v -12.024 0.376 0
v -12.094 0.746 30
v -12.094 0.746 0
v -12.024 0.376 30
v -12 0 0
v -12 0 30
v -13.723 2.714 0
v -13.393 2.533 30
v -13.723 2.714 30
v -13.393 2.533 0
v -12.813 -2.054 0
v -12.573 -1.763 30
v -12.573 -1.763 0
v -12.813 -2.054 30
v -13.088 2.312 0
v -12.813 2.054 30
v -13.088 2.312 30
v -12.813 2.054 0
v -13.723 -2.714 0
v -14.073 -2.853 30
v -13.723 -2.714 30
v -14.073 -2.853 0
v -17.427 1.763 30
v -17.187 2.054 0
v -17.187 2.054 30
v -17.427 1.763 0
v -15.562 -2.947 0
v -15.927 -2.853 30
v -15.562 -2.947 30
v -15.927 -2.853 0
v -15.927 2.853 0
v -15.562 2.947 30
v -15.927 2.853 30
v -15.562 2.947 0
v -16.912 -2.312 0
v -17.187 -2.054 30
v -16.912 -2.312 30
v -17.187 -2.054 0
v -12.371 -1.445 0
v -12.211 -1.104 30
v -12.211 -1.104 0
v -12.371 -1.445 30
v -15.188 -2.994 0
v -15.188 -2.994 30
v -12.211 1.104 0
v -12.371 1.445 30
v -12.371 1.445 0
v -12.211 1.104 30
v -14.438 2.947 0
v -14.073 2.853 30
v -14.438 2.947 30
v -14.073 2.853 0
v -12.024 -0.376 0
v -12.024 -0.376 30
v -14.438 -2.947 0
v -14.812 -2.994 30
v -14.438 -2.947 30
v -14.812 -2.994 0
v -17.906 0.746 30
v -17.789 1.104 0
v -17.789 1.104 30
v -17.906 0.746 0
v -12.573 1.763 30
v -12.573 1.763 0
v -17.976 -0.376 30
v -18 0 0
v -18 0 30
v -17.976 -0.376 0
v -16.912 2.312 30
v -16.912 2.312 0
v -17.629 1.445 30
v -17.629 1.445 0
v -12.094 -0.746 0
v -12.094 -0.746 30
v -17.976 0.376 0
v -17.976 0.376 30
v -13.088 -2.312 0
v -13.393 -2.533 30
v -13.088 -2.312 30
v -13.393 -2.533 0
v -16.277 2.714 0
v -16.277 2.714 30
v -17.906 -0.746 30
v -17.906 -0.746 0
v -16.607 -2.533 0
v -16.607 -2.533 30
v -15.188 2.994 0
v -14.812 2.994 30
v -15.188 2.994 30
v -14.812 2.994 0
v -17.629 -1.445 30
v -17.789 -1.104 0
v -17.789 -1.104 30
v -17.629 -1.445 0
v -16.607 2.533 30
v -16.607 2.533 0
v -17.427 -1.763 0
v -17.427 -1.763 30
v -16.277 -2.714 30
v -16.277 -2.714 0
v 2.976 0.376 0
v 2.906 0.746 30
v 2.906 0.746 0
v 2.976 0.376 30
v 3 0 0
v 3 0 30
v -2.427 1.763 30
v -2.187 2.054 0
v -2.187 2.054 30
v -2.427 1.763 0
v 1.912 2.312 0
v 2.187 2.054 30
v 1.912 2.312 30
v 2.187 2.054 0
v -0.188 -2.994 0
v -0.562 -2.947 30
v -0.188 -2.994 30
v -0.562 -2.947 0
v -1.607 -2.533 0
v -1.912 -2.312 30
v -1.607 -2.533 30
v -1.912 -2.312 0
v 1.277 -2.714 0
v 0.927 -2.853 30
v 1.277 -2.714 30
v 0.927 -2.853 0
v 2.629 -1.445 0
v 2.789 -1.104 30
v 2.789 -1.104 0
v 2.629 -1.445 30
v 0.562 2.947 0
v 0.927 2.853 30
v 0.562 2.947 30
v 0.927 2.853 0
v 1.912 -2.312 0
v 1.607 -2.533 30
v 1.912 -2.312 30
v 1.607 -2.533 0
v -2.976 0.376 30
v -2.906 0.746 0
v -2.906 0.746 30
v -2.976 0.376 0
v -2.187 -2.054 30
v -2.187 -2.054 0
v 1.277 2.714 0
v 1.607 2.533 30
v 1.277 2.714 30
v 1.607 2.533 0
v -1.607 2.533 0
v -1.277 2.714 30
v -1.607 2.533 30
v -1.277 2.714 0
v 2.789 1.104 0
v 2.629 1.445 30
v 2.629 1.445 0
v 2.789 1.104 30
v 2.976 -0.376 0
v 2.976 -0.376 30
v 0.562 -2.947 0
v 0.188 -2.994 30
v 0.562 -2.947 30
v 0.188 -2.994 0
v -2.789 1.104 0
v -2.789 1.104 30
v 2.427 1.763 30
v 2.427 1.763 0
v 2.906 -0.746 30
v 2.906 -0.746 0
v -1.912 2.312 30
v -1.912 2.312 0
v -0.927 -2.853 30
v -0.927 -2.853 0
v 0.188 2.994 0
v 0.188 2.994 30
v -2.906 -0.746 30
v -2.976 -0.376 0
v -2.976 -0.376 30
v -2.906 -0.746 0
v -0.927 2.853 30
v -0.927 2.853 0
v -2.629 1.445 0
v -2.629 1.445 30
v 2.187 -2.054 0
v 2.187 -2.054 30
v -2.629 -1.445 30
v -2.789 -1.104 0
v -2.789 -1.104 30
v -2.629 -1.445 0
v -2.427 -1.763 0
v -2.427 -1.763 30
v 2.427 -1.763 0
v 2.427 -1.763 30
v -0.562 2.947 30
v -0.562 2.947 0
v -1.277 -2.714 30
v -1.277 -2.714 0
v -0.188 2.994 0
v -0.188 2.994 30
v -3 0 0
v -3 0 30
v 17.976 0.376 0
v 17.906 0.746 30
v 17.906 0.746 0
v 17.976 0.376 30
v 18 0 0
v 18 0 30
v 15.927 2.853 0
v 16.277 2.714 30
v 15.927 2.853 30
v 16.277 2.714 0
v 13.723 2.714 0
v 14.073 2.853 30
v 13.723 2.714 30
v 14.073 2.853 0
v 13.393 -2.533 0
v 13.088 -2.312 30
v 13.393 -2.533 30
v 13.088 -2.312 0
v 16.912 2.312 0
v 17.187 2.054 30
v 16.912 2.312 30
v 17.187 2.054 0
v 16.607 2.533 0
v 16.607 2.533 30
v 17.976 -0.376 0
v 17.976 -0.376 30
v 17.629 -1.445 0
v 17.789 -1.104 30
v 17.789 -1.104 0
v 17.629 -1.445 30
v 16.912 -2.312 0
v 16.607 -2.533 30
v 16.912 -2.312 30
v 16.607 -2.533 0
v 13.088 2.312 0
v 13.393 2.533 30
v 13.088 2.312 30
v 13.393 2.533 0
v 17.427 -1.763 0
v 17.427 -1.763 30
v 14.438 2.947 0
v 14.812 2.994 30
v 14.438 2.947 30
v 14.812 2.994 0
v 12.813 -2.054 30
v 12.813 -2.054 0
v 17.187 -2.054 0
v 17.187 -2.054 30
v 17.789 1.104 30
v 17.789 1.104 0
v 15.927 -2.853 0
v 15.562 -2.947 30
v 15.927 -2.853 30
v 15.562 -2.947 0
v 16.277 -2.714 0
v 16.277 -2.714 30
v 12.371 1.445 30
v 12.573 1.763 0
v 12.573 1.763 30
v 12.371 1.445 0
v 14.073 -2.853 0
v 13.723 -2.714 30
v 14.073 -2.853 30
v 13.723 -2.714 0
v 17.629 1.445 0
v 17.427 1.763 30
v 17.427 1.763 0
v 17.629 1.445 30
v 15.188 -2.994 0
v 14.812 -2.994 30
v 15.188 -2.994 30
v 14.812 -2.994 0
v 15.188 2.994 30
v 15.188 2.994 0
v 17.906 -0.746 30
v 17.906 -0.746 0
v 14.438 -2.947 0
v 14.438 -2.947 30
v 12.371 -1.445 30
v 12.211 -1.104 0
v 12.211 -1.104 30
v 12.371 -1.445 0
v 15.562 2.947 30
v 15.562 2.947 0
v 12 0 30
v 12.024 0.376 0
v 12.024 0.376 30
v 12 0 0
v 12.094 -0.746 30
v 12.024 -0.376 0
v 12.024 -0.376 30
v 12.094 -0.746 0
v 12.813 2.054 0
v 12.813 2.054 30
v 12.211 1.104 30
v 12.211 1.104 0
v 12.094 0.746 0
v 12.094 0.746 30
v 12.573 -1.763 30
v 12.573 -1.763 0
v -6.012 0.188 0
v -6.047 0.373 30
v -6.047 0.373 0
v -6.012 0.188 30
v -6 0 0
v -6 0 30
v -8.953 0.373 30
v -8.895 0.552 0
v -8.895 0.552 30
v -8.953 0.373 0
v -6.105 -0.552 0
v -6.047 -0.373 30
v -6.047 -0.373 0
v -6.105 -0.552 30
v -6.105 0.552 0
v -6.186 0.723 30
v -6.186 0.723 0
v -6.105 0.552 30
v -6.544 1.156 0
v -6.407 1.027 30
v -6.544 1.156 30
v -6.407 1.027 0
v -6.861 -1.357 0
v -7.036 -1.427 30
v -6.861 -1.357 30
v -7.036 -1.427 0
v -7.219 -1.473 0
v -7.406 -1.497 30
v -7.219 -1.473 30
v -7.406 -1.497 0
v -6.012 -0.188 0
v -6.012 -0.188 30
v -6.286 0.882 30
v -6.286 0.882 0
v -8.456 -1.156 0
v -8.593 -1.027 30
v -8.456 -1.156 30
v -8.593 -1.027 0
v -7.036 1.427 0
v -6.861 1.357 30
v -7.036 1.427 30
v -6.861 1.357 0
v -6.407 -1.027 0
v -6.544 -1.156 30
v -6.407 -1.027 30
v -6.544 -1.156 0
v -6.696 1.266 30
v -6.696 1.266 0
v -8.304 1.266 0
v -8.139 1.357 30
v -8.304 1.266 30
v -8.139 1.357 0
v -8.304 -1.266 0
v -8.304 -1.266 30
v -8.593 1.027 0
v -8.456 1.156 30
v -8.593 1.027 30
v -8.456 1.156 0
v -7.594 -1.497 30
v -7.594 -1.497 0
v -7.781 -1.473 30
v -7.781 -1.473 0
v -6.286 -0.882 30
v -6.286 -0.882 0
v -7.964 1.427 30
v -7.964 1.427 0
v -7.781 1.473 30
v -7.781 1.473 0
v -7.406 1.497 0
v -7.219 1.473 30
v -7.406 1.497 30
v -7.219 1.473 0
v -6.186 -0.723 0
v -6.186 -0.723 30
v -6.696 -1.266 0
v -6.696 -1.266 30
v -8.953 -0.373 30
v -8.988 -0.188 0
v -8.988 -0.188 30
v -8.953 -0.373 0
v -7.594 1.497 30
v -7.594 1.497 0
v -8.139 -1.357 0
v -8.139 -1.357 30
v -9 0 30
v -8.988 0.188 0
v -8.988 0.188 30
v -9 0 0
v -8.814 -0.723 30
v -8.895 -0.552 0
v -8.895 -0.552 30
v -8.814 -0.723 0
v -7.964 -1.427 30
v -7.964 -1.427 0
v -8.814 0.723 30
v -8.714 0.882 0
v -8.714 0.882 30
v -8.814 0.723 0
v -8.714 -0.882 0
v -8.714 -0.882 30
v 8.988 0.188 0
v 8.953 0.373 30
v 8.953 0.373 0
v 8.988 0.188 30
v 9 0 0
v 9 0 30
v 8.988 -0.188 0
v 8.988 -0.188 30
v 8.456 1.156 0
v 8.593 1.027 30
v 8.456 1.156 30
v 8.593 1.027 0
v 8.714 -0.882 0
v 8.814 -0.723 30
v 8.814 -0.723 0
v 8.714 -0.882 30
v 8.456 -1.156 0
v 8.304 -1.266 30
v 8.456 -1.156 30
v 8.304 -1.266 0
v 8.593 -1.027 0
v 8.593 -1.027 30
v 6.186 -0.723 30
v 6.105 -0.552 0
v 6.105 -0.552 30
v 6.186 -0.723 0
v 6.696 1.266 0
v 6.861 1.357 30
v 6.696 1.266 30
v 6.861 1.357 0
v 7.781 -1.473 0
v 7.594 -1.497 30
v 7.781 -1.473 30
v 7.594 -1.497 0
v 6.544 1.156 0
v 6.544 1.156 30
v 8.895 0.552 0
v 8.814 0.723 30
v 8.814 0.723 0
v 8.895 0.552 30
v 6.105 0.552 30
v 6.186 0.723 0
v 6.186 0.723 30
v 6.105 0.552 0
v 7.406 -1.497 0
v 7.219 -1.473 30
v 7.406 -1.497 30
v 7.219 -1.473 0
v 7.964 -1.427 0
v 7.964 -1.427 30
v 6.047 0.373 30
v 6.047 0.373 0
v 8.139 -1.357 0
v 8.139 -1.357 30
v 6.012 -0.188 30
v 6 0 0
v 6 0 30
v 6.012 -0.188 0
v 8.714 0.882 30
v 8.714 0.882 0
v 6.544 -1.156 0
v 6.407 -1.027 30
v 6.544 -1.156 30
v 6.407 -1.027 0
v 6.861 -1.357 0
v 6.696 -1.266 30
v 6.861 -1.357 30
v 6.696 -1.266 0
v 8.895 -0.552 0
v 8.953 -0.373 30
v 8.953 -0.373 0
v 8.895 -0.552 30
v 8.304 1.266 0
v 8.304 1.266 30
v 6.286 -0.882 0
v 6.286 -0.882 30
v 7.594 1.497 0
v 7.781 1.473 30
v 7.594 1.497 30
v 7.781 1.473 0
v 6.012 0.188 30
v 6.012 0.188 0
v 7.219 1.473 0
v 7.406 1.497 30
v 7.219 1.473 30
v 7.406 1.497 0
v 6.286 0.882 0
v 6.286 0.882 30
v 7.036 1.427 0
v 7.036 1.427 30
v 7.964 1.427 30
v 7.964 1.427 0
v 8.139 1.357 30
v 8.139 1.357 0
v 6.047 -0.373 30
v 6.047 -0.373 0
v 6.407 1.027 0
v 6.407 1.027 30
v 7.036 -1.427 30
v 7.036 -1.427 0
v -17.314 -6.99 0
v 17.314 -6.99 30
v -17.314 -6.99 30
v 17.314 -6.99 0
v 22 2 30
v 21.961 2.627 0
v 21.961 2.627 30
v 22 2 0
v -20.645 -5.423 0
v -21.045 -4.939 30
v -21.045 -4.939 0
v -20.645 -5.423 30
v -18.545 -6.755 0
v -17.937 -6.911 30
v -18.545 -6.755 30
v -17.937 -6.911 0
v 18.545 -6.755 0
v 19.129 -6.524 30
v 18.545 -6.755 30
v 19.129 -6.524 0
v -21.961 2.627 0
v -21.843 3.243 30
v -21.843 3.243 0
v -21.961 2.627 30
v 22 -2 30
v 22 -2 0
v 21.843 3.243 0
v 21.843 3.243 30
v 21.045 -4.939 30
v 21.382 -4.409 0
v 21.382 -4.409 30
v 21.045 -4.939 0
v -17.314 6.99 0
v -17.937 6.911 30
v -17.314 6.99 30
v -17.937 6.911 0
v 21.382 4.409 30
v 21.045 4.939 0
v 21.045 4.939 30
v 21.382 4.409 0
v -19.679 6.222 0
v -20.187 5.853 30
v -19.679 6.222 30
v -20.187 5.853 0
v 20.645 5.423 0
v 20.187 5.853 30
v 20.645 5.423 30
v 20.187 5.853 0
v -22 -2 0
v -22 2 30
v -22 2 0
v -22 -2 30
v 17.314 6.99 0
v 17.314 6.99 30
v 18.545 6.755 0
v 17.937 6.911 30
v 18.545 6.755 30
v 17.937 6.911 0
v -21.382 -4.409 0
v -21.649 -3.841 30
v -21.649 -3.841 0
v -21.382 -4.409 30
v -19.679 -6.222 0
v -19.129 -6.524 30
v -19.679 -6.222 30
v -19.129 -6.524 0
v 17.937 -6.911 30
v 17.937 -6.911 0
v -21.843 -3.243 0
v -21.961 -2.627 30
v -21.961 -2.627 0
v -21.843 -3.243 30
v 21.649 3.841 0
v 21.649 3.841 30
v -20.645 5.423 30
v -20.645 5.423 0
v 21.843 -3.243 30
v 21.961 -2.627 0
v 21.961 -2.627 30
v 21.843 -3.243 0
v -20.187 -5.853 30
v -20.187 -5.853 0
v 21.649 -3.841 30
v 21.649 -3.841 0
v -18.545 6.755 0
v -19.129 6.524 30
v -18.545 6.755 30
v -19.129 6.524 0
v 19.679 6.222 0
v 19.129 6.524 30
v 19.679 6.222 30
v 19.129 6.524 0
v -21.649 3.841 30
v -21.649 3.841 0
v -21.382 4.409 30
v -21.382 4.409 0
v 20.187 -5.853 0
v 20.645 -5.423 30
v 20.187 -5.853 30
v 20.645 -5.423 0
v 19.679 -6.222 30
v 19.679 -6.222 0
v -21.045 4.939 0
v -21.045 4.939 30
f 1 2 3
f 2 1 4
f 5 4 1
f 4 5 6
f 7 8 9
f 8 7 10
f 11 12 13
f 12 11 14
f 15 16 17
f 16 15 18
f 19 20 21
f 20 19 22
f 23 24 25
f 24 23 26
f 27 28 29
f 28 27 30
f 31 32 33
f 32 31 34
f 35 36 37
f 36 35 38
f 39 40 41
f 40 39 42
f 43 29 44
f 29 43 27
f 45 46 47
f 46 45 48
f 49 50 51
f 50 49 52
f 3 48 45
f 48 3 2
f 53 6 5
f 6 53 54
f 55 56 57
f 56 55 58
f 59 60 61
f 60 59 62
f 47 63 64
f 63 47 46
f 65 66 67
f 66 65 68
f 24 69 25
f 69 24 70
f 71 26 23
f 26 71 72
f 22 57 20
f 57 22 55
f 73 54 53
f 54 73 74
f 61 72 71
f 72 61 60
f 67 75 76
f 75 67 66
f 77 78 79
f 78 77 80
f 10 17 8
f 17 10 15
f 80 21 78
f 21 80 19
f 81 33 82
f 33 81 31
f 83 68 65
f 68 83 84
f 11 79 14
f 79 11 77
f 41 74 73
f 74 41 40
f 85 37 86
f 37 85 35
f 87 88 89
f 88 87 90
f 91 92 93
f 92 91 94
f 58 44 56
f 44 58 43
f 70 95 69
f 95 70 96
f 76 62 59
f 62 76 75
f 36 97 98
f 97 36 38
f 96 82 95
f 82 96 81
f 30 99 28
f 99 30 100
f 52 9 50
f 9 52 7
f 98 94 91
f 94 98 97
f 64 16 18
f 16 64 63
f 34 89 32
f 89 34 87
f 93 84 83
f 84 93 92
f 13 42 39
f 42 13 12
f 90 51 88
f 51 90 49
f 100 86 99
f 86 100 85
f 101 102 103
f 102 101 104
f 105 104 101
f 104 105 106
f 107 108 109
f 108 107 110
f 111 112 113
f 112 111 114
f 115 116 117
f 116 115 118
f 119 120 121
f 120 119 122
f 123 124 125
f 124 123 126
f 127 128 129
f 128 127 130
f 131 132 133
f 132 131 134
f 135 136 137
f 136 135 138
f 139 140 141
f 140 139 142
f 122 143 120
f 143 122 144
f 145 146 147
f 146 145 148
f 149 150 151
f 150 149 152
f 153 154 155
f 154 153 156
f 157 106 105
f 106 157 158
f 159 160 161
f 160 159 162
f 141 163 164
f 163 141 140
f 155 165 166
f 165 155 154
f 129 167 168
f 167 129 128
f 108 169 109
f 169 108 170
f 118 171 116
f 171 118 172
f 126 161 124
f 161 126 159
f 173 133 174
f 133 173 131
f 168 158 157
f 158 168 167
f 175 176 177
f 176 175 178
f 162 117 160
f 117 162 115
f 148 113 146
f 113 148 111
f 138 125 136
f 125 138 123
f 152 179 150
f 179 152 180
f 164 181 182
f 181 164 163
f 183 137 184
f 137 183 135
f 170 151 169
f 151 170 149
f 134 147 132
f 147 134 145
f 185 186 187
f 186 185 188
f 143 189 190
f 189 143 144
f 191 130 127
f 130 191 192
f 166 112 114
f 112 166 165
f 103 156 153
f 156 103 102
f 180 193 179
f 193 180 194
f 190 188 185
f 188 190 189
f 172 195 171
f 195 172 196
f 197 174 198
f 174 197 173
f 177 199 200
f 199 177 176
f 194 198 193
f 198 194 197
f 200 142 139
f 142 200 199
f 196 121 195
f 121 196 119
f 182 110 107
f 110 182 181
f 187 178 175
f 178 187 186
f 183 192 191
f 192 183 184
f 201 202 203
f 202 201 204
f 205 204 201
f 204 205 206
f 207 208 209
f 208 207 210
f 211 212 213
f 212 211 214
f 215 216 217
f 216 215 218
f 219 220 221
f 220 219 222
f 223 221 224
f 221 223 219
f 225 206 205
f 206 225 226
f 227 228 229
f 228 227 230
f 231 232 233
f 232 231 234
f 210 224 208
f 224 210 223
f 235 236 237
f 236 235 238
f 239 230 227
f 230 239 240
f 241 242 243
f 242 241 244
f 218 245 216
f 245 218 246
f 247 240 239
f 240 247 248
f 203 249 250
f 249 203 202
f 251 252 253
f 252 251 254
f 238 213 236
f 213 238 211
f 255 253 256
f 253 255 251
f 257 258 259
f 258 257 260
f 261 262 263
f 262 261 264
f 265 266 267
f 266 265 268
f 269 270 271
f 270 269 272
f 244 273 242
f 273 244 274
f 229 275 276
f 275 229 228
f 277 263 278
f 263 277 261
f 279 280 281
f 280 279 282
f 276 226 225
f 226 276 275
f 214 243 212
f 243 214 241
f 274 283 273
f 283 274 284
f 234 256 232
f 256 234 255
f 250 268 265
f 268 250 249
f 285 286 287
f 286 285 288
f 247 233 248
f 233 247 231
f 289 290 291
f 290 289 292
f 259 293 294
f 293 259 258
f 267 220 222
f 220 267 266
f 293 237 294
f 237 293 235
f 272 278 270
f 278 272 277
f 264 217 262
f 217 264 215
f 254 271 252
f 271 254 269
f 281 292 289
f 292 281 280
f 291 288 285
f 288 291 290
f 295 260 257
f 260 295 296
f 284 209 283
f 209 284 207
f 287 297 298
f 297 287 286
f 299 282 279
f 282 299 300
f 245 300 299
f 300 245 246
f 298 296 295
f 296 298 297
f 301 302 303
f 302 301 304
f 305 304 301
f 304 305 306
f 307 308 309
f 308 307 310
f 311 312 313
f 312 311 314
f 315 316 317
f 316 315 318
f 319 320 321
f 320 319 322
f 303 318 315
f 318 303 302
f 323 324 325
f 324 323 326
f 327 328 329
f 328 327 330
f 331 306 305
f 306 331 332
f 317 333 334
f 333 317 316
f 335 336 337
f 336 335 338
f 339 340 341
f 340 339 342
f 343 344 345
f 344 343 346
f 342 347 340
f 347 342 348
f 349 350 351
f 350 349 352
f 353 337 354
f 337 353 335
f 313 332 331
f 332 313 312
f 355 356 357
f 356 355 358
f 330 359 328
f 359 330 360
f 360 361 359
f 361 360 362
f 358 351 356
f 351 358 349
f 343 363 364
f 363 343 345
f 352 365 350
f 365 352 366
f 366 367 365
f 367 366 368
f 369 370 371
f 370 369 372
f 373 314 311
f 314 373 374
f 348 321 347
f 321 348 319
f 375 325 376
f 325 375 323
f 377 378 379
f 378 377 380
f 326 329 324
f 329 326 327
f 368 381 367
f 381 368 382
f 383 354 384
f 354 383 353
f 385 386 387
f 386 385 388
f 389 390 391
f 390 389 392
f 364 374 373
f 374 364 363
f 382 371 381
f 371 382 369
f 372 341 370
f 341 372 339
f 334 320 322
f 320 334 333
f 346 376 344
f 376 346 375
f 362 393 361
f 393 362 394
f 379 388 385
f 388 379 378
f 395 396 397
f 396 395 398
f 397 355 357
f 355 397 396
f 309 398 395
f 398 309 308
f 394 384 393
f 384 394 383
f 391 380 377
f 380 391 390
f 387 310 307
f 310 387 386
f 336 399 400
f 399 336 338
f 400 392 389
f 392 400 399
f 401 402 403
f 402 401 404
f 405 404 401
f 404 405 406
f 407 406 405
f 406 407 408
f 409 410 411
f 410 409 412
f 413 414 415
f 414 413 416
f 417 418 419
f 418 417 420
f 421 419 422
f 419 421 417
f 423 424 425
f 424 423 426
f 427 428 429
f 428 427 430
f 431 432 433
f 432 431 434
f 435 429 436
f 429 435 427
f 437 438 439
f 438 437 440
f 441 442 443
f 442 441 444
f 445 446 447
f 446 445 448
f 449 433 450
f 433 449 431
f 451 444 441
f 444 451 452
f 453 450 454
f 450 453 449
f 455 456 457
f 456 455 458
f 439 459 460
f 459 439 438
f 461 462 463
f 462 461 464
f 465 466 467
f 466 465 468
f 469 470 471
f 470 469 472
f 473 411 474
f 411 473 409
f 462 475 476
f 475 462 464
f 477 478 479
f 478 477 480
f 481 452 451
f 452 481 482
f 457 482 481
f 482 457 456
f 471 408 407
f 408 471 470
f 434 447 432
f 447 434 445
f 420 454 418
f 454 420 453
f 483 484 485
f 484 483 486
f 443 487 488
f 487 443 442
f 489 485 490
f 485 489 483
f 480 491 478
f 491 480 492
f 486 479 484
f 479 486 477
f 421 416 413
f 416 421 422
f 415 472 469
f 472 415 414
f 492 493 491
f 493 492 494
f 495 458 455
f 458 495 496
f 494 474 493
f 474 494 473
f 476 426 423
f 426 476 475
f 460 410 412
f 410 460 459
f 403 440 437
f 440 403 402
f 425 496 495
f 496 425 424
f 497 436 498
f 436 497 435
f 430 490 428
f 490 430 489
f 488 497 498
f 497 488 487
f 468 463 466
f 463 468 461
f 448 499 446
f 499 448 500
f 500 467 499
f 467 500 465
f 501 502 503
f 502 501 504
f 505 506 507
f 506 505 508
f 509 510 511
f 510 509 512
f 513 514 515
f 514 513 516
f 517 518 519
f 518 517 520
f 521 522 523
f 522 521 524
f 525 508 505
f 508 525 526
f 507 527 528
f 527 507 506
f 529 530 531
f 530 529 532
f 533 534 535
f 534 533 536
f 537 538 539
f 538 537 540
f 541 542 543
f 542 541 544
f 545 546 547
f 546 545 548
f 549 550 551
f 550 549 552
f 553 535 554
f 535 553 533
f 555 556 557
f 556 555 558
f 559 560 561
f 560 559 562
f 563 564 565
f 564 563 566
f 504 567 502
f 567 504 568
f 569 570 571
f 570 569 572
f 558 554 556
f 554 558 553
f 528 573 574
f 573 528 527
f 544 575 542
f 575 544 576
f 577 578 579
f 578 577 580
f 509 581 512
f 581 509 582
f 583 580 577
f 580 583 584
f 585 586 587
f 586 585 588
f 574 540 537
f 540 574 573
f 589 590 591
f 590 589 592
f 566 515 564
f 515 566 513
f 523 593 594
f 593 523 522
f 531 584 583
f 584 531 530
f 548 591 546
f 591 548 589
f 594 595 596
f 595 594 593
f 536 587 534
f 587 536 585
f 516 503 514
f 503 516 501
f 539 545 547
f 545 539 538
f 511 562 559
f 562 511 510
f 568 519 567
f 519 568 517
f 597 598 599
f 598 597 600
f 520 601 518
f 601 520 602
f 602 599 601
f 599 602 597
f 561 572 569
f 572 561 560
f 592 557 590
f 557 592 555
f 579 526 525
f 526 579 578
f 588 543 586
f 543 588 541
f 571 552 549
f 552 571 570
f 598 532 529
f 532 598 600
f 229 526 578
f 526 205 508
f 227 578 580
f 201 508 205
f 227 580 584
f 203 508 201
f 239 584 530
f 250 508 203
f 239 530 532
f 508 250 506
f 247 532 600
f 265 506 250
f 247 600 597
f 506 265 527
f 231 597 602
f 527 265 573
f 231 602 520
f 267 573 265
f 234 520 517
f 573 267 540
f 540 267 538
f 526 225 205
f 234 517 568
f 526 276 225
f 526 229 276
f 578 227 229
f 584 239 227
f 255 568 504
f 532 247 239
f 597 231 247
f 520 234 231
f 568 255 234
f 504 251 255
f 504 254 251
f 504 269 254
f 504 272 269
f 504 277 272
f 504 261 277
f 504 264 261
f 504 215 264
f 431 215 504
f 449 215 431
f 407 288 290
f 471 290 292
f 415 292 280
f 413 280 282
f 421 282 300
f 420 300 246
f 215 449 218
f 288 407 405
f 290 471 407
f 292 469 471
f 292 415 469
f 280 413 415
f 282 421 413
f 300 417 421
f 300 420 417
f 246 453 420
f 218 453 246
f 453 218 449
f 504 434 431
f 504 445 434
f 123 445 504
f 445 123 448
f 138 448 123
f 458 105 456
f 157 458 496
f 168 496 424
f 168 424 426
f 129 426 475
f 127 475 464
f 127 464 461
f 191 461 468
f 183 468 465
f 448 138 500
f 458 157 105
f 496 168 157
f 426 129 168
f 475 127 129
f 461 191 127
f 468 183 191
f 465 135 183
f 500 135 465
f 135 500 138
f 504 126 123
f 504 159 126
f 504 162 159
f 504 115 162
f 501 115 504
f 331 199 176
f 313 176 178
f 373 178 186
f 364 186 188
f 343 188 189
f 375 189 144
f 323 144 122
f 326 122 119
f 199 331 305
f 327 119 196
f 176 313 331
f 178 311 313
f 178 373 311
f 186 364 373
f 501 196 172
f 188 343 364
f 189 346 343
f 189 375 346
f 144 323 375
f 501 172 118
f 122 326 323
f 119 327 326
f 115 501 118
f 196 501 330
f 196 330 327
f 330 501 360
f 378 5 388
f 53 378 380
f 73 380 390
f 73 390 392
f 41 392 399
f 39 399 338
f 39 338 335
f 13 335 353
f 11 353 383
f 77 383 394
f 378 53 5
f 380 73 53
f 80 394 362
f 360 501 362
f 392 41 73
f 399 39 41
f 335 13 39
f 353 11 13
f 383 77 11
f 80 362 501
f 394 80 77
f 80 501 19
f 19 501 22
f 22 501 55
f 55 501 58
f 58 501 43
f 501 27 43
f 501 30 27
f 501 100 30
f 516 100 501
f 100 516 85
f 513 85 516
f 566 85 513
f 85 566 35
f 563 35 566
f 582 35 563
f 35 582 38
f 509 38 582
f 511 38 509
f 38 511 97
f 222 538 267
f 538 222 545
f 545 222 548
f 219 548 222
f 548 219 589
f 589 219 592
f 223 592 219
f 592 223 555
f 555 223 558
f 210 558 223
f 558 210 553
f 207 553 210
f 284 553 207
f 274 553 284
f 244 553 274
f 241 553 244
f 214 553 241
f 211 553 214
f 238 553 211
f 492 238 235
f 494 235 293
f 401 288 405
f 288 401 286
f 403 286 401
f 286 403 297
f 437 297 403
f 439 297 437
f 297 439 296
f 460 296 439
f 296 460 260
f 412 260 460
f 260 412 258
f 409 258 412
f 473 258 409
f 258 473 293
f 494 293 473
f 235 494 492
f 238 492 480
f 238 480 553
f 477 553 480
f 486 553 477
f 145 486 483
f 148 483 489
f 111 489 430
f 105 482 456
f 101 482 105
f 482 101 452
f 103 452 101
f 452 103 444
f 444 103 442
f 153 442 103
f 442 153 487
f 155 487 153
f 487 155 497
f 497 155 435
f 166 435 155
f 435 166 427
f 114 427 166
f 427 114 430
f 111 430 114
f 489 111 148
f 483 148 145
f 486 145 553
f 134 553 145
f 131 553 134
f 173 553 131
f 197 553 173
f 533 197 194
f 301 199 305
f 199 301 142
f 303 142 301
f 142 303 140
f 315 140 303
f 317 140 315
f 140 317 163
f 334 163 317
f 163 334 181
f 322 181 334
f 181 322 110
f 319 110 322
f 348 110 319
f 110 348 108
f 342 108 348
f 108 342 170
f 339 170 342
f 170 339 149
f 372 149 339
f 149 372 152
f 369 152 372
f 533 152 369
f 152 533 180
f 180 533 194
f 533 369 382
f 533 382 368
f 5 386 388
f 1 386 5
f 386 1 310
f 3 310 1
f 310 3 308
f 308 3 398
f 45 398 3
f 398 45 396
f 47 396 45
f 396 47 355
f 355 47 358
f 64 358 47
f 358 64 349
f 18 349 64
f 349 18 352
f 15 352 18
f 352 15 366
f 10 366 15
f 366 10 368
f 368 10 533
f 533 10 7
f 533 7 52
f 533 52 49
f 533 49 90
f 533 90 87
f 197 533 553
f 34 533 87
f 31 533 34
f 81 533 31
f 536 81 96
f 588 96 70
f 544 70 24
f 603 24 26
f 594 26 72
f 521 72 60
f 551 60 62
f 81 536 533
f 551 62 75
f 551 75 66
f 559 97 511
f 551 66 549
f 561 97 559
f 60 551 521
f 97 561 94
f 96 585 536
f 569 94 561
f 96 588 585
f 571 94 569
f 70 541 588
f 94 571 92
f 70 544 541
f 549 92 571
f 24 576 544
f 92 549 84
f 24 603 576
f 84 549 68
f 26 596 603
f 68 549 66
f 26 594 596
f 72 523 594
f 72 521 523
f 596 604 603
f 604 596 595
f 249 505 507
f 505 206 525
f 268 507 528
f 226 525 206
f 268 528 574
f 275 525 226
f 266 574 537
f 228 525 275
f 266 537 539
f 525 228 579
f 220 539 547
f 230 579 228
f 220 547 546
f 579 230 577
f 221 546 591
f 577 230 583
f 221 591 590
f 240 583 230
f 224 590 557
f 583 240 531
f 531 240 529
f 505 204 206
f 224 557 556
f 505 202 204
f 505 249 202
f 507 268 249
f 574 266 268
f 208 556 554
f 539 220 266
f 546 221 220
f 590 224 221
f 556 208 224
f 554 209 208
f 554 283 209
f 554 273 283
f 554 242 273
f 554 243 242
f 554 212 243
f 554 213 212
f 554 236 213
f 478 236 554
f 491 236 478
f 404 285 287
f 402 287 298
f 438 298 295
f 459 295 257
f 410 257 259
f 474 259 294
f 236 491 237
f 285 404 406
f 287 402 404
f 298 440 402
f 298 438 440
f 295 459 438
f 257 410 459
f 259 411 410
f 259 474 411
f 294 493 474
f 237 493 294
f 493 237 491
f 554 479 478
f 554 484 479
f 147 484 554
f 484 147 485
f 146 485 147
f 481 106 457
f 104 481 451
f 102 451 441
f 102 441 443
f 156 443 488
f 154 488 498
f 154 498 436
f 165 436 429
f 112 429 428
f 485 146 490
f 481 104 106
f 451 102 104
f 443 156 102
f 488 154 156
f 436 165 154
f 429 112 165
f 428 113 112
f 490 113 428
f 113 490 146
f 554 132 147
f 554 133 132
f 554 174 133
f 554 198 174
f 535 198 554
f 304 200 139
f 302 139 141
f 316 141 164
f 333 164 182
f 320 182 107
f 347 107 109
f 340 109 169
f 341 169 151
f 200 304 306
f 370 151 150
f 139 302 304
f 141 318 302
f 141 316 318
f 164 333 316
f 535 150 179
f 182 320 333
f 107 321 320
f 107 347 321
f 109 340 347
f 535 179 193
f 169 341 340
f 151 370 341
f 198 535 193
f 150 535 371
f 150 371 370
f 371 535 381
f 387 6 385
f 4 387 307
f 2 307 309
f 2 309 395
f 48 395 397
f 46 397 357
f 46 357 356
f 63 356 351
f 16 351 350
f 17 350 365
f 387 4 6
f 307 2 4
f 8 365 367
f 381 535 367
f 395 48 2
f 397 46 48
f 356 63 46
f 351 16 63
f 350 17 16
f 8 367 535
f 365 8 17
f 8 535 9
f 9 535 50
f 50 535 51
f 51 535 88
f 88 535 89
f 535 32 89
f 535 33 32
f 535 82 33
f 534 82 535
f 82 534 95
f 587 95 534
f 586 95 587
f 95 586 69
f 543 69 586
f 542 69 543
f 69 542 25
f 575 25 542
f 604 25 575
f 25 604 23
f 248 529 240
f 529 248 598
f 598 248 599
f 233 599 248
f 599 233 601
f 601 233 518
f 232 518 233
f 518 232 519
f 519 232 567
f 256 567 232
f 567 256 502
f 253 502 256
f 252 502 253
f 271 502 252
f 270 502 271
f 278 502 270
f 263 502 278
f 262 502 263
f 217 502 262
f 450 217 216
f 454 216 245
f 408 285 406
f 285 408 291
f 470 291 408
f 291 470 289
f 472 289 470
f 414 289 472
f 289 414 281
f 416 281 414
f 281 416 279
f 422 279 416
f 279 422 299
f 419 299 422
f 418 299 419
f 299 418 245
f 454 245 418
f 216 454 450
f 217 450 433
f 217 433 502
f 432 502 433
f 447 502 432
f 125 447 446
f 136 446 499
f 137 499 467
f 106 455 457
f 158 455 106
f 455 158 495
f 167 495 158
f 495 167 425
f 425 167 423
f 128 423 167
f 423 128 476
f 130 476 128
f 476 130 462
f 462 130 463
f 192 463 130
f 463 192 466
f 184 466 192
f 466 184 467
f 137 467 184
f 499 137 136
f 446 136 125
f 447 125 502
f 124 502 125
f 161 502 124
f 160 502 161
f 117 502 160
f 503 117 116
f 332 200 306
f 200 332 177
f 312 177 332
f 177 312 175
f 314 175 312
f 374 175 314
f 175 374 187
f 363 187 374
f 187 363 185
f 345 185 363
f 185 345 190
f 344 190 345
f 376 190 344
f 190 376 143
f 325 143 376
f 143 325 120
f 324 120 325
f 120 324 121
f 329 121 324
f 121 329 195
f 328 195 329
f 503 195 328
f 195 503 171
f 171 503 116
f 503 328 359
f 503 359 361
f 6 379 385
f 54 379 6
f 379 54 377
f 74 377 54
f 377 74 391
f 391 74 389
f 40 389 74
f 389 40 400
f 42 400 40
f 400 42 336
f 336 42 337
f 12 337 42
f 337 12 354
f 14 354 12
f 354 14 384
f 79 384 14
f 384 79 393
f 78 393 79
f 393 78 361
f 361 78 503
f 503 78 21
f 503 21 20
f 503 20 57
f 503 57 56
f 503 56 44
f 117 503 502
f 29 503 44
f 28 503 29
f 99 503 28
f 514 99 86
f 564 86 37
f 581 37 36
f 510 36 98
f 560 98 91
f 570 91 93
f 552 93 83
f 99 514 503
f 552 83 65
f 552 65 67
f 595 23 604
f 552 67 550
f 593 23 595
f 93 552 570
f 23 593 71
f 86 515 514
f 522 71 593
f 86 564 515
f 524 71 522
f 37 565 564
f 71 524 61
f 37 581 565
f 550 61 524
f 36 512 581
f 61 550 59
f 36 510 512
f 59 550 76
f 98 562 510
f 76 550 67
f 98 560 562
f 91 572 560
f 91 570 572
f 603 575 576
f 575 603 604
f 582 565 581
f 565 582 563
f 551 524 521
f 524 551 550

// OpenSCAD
$fn = 50;


difference() {
	union() {
		translate(v = [0, 0, 0]) {
			rotate(a = [0, 0, 0]) {
				hull() {
					translate(v = [-17.0000000000, 2.0000000000, 0]) {
						rotate(a = [0, 0, 0]) {
							translate(v = [0, 0, 0]) {
								rotate(a = [0, 0, 0]) {
									cylinder(h = 30, r = 5);
								}
							}
						}
					}
					translate(v = [17.0000000000, 2.0000000000, 0]) {
						rotate(a = [0, 0, 0]) {
							translate(v = [0, 0, 0]) {
								rotate(a = [0, 0, 0]) {
									cylinder(h = 30, r = 5);
								}
							}
						}
					}
					translate(v = [-17.0000000000, -2.0000000000, 0]) {
						rotate(a = [0, 0, 0]) {
							translate(v = [0, 0, 0]) {
								rotate(a = [0, 0, 0]) {
									cylinder(h = 30, r = 5);
								}
							}
						}
					}
					translate(v = [17.0000000000, -2.0000000000, 0]) {
						rotate(a = [0, 0, 0]) {
							translate(v = [0, 0, 0]) {
								rotate(a = [0, 0, 0]) {
									cylinder(h = 30, r = 5);
								}
							}
						}
					}
				}
			}
		}
	}
	union() {
		translate(v = [-15.0000000000, 0.0000000000, 0]) {
			rotate(a = [0, 0, 0]) {
				translate(v = [0, 0, -50]) {
					rotate(a = [0, 0, 0]) {
						cylinder(h = 100, r = 3.0000000000);
					}
				}
			}
		}
		translate(v = [0.0000000000, 0.0000000000, 0]) {
			rotate(a = [0, 0, 0]) {
				translate(v = [0, 0, -50]) {
					rotate(a = [0, 0, 0]) {
						cylinder(h = 100, r = 3.0000000000);
					}
				}
			}
		}
		translate(v = [15.0000000000, 0.0000000000, 0]) {
			rotate(a = [0, 0, 0]) {
				translate(v = [0, 0, -50]) {
					rotate(a = [0, 0, 0]) {
						cylinder(h = 100, r = 3.0000000000);
					}
				}
			}
		}
		translate(v = [-15.0000000000, 0.0000000000, 0]) {
			rotate(a = [0, 0, 0]) {
				translate(v = [0, 0, -50]) {
					rotate(a = [0, 0, 0]) {
						cylinder(h = 100, r = 1.5000000000);
					}
				}
			}
		}
		translate(v = [-7.5000000000, 0.0000000000, 0]) {
			rotate(a = [0, 0, 0]) {
				translate(v = [0, 0, -50]) {
					rotate(a = [0, 0, 0]) {
						cylinder(h = 100, r = 1.5000000000);
					}
				}
			}
		}
		translate(v = [0.0000000000, 0.0000000000, 0]) {
			rotate(a = [0, 0, 0]) {
				translate(v = [0, 0, -50]) {
					rotate(a = [0, 0, 0]) {
						cylinder(h = 100, r = 1.5000000000);
					}
				}
			}
		}
		translate(v = [7.5000000000, 0.0000000000, 0]) {
			rotate(a = [0, 0, 0]) {
				translate(v = [0, 0, -50]) {
					rotate(a = [0, 0, 0]) {
						cylinder(h = 100, r = 1.5000000000);
					}
				}
			}
		}
		translate(v = [15.0000000000, 0.0000000000, 0]) {
			rotate(a = [0, 0, 0]) {
				translate(v = [0, 0, -50]) {
					rotate(a = [0, 0, 0]) {
						cylinder(h = 100, r = 1.5000000000);
					}
				}
			}
		}
	}
}
